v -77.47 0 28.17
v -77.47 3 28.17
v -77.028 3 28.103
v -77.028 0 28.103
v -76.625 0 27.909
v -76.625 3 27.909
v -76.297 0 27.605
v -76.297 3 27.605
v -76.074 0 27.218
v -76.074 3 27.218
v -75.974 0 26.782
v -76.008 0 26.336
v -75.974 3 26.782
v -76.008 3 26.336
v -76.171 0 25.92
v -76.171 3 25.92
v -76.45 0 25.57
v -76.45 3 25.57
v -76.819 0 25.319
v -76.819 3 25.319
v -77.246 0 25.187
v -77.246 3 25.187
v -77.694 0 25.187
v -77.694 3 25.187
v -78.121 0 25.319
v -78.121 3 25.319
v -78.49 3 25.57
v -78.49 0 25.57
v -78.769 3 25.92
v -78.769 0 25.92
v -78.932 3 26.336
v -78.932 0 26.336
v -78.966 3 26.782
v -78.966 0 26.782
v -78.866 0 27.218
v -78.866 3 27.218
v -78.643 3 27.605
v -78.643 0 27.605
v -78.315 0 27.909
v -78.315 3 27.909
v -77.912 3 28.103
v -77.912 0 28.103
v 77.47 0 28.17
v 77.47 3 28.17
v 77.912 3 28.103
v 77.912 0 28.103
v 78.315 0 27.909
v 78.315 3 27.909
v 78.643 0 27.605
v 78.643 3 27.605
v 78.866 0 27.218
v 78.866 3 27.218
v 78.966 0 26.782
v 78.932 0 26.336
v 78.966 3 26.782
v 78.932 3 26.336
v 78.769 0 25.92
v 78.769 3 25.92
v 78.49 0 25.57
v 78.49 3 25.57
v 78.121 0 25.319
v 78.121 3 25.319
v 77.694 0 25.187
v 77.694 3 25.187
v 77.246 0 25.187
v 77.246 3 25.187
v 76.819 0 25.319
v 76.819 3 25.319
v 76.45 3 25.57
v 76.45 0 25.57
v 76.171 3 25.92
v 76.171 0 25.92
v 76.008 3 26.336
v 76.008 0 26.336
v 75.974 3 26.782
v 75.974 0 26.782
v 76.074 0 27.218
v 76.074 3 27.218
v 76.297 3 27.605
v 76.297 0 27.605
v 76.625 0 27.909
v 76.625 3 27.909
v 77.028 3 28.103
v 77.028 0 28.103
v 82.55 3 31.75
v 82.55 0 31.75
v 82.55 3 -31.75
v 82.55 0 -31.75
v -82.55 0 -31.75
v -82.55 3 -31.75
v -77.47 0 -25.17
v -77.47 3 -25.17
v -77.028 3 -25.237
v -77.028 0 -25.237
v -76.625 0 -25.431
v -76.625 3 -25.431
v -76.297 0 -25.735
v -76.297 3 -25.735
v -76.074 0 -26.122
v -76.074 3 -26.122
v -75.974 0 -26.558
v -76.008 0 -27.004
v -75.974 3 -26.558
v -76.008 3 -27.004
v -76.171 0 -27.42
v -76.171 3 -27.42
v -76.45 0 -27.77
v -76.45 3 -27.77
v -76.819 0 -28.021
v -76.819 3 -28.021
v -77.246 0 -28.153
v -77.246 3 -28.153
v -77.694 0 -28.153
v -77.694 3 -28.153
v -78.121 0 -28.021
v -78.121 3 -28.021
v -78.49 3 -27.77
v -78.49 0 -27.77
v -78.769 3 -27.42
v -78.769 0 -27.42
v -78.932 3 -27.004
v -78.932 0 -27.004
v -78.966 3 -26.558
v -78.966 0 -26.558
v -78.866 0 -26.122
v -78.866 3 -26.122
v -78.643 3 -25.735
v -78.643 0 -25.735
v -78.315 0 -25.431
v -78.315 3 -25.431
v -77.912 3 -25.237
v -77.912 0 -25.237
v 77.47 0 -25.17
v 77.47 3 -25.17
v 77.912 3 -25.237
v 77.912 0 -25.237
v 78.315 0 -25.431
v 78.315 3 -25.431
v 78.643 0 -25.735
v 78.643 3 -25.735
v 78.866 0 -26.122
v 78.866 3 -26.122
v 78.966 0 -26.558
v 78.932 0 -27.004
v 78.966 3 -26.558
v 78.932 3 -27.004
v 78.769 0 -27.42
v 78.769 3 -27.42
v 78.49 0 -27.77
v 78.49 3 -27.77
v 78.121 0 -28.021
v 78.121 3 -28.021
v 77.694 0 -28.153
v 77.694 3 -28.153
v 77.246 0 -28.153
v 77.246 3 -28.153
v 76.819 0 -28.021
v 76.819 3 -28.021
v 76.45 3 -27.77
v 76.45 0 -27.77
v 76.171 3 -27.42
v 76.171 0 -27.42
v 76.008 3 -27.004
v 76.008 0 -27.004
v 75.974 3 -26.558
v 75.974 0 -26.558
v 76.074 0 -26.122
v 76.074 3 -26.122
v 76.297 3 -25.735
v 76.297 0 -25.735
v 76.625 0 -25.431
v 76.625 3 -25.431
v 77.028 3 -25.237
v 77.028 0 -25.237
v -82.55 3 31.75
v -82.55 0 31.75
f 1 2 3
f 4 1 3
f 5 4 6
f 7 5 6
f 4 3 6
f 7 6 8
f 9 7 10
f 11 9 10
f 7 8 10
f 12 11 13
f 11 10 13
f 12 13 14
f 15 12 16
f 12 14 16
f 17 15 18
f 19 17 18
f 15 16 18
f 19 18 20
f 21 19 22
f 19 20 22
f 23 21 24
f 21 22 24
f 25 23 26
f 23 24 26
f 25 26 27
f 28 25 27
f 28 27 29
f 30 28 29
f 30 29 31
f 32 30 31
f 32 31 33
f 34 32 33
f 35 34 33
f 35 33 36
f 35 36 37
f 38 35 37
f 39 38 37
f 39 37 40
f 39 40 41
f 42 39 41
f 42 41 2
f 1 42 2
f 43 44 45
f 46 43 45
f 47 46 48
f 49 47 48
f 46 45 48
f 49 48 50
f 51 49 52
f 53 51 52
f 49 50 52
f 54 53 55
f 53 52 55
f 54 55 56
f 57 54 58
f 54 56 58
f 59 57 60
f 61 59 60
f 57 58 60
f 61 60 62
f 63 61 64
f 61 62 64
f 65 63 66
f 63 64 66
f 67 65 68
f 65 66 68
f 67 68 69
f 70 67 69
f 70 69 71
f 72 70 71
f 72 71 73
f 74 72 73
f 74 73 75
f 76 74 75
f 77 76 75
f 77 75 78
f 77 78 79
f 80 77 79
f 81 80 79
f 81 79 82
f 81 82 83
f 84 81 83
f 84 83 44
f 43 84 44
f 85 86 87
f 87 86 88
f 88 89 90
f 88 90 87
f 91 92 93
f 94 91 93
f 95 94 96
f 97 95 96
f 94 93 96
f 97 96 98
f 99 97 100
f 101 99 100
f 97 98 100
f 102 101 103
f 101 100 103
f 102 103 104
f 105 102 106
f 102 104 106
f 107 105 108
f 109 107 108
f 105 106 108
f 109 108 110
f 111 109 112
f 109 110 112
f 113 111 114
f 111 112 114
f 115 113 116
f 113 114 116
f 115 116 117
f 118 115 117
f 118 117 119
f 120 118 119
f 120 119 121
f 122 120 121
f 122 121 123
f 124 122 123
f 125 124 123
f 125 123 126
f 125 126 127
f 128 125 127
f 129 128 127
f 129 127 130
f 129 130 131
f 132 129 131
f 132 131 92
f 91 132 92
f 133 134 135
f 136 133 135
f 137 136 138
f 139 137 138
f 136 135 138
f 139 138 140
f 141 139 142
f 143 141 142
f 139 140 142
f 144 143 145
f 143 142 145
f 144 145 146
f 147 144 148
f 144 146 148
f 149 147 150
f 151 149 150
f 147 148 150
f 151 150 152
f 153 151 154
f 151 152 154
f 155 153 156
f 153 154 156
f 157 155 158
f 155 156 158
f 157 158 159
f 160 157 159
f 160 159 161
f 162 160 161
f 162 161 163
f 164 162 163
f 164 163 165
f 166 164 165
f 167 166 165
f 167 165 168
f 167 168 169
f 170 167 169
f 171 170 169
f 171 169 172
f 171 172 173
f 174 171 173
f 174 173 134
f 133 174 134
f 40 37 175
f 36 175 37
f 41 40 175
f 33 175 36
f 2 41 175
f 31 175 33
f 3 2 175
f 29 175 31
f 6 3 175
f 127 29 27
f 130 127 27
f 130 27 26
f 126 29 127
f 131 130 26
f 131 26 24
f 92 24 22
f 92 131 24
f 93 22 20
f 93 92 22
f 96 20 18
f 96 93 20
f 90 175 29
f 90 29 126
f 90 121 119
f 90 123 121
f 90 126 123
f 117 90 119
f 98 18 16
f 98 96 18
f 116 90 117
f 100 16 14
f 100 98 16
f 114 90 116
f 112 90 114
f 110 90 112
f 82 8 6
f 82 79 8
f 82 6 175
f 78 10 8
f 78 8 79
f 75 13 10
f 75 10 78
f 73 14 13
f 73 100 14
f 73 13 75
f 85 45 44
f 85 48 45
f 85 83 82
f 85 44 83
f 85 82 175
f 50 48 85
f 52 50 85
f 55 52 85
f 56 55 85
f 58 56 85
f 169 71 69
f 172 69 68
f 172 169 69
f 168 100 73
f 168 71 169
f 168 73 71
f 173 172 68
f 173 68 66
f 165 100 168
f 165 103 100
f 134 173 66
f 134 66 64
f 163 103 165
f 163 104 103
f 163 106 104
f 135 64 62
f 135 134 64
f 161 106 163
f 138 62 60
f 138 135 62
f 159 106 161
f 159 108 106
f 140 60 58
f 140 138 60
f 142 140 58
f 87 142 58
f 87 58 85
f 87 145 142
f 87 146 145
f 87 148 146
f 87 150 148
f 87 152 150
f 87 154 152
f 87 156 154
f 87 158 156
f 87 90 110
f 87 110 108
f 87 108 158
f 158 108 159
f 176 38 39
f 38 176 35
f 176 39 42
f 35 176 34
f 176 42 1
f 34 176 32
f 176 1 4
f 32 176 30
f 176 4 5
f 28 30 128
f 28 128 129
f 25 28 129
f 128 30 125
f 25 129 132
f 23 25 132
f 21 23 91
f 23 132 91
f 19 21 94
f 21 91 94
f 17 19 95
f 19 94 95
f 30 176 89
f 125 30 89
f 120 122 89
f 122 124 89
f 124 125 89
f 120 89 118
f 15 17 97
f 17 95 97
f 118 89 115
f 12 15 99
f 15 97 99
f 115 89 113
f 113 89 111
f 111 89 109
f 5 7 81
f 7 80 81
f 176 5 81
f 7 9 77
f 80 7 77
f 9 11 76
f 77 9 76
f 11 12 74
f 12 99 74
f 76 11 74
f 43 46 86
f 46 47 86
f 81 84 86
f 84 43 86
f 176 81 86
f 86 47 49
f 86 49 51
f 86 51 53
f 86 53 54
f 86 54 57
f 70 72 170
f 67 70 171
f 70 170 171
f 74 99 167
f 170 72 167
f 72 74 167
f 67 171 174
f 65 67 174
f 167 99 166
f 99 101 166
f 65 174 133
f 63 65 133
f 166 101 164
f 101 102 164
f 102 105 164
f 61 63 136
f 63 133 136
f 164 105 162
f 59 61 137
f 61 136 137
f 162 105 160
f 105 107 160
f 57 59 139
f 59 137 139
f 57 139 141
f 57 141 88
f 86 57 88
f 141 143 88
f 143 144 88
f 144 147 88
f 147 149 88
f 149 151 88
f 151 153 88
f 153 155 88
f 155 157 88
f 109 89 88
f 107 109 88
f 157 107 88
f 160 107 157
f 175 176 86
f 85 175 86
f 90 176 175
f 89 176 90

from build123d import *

# Parameters (mm, degrees)
SKETCH1_W           = 165.1
SKETCH1_H           = 63.5
BOSS_EXTRUDE1_DEPTH = 3
CUT_EXTRUDE1_REACH  = 90.496
SKETCH2_R           = 1.5


with BuildPart() as part:
    # Sketch1 → Boss-Extrude1 (new body)
    with BuildSketch(Plane(origin=(0, 0, 0), x_dir=(1, 0, 0), z_dir=(0, 1, 0))):
        Rectangle(SKETCH1_W, SKETCH1_H)
    extrude(amount=BOSS_EXTRUDE1_DEPTH)

    # Sketch2 → Cut-Extrude1 (cut, up to next)
    with BuildSketch(Plane(origin=(0, 3, 0), x_dir=(1, 0, 0), z_dir=(0, 1, 0)), mode=Mode.PRIVATE) as cut_extrude1_sk1:
        with Locations(Location((-77.47, 26.67, 0), (0, 0, 270))):
            Circle(SKETCH2_R)
    cut_extrude1_tool1 = extrude(cut_extrude1_sk1.sketch, amount=-CUT_EXTRUDE1_REACH, mode=Mode.PRIVATE) & part.part
    # Sketch2 → Cut-Extrude1 (cut, up to next)
    with BuildSketch(Plane(origin=(0, 3, 0), x_dir=(1, 0, 0), z_dir=(0, 1, 0)), mode=Mode.PRIVATE) as cut_extrude1_sk2:
        with Locations(Location((-77.47, -26.67, 0), (0, 0, 270))):
            Circle(SKETCH2_R)
    cut_extrude1_tool2 = extrude(cut_extrude1_sk2.sketch, amount=-CUT_EXTRUDE1_REACH, mode=Mode.PRIVATE) & part.part
    # Sketch2 → Cut-Extrude1 (cut, up to next)
    with BuildSketch(Plane(origin=(0, 3, 0), x_dir=(1, 0, 0), z_dir=(0, 1, 0)), mode=Mode.PRIVATE) as cut_extrude1_sk3:
        with Locations(Location((77.47, 26.67, 0), (0, 0, 270))):
            Circle(SKETCH2_R)
    cut_extrude1_tool3 = extrude(cut_extrude1_sk3.sketch, amount=-CUT_EXTRUDE1_REACH, mode=Mode.PRIVATE) & part.part
    # Sketch2 → Cut-Extrude1 (cut, up to next)
    with BuildSketch(Plane(origin=(0, 3, 0), x_dir=(1, 0, 0), z_dir=(0, 1, 0)), mode=Mode.PRIVATE) as cut_extrude1_sk4:
        with Locations(Location((77.47, -26.67, 0), (0, 0, 270))):
            Circle(SKETCH2_R)
    cut_extrude1_tool4 = extrude(cut_extrude1_sk4.sketch, amount=-CUT_EXTRUDE1_REACH, mode=Mode.PRIVATE) & part.part
    add(cut_extrude1_tool1.solids().sort_by_distance((-77.47, 3, -26.67))[0], mode=Mode.SUBTRACT)
    add(cut_extrude1_tool2.solids().sort_by_distance((-77.47, 3, 26.67))[0], mode=Mode.SUBTRACT)
    add(cut_extrude1_tool3.solids().sort_by_distance((77.47, 3, -26.67))[0], mode=Mode.SUBTRACT)
    add(cut_extrude1_tool4.solids().sort_by_distance((77.47, 3, 26.67))[0], mode=Mode.SUBTRACT)


solid = part.part
